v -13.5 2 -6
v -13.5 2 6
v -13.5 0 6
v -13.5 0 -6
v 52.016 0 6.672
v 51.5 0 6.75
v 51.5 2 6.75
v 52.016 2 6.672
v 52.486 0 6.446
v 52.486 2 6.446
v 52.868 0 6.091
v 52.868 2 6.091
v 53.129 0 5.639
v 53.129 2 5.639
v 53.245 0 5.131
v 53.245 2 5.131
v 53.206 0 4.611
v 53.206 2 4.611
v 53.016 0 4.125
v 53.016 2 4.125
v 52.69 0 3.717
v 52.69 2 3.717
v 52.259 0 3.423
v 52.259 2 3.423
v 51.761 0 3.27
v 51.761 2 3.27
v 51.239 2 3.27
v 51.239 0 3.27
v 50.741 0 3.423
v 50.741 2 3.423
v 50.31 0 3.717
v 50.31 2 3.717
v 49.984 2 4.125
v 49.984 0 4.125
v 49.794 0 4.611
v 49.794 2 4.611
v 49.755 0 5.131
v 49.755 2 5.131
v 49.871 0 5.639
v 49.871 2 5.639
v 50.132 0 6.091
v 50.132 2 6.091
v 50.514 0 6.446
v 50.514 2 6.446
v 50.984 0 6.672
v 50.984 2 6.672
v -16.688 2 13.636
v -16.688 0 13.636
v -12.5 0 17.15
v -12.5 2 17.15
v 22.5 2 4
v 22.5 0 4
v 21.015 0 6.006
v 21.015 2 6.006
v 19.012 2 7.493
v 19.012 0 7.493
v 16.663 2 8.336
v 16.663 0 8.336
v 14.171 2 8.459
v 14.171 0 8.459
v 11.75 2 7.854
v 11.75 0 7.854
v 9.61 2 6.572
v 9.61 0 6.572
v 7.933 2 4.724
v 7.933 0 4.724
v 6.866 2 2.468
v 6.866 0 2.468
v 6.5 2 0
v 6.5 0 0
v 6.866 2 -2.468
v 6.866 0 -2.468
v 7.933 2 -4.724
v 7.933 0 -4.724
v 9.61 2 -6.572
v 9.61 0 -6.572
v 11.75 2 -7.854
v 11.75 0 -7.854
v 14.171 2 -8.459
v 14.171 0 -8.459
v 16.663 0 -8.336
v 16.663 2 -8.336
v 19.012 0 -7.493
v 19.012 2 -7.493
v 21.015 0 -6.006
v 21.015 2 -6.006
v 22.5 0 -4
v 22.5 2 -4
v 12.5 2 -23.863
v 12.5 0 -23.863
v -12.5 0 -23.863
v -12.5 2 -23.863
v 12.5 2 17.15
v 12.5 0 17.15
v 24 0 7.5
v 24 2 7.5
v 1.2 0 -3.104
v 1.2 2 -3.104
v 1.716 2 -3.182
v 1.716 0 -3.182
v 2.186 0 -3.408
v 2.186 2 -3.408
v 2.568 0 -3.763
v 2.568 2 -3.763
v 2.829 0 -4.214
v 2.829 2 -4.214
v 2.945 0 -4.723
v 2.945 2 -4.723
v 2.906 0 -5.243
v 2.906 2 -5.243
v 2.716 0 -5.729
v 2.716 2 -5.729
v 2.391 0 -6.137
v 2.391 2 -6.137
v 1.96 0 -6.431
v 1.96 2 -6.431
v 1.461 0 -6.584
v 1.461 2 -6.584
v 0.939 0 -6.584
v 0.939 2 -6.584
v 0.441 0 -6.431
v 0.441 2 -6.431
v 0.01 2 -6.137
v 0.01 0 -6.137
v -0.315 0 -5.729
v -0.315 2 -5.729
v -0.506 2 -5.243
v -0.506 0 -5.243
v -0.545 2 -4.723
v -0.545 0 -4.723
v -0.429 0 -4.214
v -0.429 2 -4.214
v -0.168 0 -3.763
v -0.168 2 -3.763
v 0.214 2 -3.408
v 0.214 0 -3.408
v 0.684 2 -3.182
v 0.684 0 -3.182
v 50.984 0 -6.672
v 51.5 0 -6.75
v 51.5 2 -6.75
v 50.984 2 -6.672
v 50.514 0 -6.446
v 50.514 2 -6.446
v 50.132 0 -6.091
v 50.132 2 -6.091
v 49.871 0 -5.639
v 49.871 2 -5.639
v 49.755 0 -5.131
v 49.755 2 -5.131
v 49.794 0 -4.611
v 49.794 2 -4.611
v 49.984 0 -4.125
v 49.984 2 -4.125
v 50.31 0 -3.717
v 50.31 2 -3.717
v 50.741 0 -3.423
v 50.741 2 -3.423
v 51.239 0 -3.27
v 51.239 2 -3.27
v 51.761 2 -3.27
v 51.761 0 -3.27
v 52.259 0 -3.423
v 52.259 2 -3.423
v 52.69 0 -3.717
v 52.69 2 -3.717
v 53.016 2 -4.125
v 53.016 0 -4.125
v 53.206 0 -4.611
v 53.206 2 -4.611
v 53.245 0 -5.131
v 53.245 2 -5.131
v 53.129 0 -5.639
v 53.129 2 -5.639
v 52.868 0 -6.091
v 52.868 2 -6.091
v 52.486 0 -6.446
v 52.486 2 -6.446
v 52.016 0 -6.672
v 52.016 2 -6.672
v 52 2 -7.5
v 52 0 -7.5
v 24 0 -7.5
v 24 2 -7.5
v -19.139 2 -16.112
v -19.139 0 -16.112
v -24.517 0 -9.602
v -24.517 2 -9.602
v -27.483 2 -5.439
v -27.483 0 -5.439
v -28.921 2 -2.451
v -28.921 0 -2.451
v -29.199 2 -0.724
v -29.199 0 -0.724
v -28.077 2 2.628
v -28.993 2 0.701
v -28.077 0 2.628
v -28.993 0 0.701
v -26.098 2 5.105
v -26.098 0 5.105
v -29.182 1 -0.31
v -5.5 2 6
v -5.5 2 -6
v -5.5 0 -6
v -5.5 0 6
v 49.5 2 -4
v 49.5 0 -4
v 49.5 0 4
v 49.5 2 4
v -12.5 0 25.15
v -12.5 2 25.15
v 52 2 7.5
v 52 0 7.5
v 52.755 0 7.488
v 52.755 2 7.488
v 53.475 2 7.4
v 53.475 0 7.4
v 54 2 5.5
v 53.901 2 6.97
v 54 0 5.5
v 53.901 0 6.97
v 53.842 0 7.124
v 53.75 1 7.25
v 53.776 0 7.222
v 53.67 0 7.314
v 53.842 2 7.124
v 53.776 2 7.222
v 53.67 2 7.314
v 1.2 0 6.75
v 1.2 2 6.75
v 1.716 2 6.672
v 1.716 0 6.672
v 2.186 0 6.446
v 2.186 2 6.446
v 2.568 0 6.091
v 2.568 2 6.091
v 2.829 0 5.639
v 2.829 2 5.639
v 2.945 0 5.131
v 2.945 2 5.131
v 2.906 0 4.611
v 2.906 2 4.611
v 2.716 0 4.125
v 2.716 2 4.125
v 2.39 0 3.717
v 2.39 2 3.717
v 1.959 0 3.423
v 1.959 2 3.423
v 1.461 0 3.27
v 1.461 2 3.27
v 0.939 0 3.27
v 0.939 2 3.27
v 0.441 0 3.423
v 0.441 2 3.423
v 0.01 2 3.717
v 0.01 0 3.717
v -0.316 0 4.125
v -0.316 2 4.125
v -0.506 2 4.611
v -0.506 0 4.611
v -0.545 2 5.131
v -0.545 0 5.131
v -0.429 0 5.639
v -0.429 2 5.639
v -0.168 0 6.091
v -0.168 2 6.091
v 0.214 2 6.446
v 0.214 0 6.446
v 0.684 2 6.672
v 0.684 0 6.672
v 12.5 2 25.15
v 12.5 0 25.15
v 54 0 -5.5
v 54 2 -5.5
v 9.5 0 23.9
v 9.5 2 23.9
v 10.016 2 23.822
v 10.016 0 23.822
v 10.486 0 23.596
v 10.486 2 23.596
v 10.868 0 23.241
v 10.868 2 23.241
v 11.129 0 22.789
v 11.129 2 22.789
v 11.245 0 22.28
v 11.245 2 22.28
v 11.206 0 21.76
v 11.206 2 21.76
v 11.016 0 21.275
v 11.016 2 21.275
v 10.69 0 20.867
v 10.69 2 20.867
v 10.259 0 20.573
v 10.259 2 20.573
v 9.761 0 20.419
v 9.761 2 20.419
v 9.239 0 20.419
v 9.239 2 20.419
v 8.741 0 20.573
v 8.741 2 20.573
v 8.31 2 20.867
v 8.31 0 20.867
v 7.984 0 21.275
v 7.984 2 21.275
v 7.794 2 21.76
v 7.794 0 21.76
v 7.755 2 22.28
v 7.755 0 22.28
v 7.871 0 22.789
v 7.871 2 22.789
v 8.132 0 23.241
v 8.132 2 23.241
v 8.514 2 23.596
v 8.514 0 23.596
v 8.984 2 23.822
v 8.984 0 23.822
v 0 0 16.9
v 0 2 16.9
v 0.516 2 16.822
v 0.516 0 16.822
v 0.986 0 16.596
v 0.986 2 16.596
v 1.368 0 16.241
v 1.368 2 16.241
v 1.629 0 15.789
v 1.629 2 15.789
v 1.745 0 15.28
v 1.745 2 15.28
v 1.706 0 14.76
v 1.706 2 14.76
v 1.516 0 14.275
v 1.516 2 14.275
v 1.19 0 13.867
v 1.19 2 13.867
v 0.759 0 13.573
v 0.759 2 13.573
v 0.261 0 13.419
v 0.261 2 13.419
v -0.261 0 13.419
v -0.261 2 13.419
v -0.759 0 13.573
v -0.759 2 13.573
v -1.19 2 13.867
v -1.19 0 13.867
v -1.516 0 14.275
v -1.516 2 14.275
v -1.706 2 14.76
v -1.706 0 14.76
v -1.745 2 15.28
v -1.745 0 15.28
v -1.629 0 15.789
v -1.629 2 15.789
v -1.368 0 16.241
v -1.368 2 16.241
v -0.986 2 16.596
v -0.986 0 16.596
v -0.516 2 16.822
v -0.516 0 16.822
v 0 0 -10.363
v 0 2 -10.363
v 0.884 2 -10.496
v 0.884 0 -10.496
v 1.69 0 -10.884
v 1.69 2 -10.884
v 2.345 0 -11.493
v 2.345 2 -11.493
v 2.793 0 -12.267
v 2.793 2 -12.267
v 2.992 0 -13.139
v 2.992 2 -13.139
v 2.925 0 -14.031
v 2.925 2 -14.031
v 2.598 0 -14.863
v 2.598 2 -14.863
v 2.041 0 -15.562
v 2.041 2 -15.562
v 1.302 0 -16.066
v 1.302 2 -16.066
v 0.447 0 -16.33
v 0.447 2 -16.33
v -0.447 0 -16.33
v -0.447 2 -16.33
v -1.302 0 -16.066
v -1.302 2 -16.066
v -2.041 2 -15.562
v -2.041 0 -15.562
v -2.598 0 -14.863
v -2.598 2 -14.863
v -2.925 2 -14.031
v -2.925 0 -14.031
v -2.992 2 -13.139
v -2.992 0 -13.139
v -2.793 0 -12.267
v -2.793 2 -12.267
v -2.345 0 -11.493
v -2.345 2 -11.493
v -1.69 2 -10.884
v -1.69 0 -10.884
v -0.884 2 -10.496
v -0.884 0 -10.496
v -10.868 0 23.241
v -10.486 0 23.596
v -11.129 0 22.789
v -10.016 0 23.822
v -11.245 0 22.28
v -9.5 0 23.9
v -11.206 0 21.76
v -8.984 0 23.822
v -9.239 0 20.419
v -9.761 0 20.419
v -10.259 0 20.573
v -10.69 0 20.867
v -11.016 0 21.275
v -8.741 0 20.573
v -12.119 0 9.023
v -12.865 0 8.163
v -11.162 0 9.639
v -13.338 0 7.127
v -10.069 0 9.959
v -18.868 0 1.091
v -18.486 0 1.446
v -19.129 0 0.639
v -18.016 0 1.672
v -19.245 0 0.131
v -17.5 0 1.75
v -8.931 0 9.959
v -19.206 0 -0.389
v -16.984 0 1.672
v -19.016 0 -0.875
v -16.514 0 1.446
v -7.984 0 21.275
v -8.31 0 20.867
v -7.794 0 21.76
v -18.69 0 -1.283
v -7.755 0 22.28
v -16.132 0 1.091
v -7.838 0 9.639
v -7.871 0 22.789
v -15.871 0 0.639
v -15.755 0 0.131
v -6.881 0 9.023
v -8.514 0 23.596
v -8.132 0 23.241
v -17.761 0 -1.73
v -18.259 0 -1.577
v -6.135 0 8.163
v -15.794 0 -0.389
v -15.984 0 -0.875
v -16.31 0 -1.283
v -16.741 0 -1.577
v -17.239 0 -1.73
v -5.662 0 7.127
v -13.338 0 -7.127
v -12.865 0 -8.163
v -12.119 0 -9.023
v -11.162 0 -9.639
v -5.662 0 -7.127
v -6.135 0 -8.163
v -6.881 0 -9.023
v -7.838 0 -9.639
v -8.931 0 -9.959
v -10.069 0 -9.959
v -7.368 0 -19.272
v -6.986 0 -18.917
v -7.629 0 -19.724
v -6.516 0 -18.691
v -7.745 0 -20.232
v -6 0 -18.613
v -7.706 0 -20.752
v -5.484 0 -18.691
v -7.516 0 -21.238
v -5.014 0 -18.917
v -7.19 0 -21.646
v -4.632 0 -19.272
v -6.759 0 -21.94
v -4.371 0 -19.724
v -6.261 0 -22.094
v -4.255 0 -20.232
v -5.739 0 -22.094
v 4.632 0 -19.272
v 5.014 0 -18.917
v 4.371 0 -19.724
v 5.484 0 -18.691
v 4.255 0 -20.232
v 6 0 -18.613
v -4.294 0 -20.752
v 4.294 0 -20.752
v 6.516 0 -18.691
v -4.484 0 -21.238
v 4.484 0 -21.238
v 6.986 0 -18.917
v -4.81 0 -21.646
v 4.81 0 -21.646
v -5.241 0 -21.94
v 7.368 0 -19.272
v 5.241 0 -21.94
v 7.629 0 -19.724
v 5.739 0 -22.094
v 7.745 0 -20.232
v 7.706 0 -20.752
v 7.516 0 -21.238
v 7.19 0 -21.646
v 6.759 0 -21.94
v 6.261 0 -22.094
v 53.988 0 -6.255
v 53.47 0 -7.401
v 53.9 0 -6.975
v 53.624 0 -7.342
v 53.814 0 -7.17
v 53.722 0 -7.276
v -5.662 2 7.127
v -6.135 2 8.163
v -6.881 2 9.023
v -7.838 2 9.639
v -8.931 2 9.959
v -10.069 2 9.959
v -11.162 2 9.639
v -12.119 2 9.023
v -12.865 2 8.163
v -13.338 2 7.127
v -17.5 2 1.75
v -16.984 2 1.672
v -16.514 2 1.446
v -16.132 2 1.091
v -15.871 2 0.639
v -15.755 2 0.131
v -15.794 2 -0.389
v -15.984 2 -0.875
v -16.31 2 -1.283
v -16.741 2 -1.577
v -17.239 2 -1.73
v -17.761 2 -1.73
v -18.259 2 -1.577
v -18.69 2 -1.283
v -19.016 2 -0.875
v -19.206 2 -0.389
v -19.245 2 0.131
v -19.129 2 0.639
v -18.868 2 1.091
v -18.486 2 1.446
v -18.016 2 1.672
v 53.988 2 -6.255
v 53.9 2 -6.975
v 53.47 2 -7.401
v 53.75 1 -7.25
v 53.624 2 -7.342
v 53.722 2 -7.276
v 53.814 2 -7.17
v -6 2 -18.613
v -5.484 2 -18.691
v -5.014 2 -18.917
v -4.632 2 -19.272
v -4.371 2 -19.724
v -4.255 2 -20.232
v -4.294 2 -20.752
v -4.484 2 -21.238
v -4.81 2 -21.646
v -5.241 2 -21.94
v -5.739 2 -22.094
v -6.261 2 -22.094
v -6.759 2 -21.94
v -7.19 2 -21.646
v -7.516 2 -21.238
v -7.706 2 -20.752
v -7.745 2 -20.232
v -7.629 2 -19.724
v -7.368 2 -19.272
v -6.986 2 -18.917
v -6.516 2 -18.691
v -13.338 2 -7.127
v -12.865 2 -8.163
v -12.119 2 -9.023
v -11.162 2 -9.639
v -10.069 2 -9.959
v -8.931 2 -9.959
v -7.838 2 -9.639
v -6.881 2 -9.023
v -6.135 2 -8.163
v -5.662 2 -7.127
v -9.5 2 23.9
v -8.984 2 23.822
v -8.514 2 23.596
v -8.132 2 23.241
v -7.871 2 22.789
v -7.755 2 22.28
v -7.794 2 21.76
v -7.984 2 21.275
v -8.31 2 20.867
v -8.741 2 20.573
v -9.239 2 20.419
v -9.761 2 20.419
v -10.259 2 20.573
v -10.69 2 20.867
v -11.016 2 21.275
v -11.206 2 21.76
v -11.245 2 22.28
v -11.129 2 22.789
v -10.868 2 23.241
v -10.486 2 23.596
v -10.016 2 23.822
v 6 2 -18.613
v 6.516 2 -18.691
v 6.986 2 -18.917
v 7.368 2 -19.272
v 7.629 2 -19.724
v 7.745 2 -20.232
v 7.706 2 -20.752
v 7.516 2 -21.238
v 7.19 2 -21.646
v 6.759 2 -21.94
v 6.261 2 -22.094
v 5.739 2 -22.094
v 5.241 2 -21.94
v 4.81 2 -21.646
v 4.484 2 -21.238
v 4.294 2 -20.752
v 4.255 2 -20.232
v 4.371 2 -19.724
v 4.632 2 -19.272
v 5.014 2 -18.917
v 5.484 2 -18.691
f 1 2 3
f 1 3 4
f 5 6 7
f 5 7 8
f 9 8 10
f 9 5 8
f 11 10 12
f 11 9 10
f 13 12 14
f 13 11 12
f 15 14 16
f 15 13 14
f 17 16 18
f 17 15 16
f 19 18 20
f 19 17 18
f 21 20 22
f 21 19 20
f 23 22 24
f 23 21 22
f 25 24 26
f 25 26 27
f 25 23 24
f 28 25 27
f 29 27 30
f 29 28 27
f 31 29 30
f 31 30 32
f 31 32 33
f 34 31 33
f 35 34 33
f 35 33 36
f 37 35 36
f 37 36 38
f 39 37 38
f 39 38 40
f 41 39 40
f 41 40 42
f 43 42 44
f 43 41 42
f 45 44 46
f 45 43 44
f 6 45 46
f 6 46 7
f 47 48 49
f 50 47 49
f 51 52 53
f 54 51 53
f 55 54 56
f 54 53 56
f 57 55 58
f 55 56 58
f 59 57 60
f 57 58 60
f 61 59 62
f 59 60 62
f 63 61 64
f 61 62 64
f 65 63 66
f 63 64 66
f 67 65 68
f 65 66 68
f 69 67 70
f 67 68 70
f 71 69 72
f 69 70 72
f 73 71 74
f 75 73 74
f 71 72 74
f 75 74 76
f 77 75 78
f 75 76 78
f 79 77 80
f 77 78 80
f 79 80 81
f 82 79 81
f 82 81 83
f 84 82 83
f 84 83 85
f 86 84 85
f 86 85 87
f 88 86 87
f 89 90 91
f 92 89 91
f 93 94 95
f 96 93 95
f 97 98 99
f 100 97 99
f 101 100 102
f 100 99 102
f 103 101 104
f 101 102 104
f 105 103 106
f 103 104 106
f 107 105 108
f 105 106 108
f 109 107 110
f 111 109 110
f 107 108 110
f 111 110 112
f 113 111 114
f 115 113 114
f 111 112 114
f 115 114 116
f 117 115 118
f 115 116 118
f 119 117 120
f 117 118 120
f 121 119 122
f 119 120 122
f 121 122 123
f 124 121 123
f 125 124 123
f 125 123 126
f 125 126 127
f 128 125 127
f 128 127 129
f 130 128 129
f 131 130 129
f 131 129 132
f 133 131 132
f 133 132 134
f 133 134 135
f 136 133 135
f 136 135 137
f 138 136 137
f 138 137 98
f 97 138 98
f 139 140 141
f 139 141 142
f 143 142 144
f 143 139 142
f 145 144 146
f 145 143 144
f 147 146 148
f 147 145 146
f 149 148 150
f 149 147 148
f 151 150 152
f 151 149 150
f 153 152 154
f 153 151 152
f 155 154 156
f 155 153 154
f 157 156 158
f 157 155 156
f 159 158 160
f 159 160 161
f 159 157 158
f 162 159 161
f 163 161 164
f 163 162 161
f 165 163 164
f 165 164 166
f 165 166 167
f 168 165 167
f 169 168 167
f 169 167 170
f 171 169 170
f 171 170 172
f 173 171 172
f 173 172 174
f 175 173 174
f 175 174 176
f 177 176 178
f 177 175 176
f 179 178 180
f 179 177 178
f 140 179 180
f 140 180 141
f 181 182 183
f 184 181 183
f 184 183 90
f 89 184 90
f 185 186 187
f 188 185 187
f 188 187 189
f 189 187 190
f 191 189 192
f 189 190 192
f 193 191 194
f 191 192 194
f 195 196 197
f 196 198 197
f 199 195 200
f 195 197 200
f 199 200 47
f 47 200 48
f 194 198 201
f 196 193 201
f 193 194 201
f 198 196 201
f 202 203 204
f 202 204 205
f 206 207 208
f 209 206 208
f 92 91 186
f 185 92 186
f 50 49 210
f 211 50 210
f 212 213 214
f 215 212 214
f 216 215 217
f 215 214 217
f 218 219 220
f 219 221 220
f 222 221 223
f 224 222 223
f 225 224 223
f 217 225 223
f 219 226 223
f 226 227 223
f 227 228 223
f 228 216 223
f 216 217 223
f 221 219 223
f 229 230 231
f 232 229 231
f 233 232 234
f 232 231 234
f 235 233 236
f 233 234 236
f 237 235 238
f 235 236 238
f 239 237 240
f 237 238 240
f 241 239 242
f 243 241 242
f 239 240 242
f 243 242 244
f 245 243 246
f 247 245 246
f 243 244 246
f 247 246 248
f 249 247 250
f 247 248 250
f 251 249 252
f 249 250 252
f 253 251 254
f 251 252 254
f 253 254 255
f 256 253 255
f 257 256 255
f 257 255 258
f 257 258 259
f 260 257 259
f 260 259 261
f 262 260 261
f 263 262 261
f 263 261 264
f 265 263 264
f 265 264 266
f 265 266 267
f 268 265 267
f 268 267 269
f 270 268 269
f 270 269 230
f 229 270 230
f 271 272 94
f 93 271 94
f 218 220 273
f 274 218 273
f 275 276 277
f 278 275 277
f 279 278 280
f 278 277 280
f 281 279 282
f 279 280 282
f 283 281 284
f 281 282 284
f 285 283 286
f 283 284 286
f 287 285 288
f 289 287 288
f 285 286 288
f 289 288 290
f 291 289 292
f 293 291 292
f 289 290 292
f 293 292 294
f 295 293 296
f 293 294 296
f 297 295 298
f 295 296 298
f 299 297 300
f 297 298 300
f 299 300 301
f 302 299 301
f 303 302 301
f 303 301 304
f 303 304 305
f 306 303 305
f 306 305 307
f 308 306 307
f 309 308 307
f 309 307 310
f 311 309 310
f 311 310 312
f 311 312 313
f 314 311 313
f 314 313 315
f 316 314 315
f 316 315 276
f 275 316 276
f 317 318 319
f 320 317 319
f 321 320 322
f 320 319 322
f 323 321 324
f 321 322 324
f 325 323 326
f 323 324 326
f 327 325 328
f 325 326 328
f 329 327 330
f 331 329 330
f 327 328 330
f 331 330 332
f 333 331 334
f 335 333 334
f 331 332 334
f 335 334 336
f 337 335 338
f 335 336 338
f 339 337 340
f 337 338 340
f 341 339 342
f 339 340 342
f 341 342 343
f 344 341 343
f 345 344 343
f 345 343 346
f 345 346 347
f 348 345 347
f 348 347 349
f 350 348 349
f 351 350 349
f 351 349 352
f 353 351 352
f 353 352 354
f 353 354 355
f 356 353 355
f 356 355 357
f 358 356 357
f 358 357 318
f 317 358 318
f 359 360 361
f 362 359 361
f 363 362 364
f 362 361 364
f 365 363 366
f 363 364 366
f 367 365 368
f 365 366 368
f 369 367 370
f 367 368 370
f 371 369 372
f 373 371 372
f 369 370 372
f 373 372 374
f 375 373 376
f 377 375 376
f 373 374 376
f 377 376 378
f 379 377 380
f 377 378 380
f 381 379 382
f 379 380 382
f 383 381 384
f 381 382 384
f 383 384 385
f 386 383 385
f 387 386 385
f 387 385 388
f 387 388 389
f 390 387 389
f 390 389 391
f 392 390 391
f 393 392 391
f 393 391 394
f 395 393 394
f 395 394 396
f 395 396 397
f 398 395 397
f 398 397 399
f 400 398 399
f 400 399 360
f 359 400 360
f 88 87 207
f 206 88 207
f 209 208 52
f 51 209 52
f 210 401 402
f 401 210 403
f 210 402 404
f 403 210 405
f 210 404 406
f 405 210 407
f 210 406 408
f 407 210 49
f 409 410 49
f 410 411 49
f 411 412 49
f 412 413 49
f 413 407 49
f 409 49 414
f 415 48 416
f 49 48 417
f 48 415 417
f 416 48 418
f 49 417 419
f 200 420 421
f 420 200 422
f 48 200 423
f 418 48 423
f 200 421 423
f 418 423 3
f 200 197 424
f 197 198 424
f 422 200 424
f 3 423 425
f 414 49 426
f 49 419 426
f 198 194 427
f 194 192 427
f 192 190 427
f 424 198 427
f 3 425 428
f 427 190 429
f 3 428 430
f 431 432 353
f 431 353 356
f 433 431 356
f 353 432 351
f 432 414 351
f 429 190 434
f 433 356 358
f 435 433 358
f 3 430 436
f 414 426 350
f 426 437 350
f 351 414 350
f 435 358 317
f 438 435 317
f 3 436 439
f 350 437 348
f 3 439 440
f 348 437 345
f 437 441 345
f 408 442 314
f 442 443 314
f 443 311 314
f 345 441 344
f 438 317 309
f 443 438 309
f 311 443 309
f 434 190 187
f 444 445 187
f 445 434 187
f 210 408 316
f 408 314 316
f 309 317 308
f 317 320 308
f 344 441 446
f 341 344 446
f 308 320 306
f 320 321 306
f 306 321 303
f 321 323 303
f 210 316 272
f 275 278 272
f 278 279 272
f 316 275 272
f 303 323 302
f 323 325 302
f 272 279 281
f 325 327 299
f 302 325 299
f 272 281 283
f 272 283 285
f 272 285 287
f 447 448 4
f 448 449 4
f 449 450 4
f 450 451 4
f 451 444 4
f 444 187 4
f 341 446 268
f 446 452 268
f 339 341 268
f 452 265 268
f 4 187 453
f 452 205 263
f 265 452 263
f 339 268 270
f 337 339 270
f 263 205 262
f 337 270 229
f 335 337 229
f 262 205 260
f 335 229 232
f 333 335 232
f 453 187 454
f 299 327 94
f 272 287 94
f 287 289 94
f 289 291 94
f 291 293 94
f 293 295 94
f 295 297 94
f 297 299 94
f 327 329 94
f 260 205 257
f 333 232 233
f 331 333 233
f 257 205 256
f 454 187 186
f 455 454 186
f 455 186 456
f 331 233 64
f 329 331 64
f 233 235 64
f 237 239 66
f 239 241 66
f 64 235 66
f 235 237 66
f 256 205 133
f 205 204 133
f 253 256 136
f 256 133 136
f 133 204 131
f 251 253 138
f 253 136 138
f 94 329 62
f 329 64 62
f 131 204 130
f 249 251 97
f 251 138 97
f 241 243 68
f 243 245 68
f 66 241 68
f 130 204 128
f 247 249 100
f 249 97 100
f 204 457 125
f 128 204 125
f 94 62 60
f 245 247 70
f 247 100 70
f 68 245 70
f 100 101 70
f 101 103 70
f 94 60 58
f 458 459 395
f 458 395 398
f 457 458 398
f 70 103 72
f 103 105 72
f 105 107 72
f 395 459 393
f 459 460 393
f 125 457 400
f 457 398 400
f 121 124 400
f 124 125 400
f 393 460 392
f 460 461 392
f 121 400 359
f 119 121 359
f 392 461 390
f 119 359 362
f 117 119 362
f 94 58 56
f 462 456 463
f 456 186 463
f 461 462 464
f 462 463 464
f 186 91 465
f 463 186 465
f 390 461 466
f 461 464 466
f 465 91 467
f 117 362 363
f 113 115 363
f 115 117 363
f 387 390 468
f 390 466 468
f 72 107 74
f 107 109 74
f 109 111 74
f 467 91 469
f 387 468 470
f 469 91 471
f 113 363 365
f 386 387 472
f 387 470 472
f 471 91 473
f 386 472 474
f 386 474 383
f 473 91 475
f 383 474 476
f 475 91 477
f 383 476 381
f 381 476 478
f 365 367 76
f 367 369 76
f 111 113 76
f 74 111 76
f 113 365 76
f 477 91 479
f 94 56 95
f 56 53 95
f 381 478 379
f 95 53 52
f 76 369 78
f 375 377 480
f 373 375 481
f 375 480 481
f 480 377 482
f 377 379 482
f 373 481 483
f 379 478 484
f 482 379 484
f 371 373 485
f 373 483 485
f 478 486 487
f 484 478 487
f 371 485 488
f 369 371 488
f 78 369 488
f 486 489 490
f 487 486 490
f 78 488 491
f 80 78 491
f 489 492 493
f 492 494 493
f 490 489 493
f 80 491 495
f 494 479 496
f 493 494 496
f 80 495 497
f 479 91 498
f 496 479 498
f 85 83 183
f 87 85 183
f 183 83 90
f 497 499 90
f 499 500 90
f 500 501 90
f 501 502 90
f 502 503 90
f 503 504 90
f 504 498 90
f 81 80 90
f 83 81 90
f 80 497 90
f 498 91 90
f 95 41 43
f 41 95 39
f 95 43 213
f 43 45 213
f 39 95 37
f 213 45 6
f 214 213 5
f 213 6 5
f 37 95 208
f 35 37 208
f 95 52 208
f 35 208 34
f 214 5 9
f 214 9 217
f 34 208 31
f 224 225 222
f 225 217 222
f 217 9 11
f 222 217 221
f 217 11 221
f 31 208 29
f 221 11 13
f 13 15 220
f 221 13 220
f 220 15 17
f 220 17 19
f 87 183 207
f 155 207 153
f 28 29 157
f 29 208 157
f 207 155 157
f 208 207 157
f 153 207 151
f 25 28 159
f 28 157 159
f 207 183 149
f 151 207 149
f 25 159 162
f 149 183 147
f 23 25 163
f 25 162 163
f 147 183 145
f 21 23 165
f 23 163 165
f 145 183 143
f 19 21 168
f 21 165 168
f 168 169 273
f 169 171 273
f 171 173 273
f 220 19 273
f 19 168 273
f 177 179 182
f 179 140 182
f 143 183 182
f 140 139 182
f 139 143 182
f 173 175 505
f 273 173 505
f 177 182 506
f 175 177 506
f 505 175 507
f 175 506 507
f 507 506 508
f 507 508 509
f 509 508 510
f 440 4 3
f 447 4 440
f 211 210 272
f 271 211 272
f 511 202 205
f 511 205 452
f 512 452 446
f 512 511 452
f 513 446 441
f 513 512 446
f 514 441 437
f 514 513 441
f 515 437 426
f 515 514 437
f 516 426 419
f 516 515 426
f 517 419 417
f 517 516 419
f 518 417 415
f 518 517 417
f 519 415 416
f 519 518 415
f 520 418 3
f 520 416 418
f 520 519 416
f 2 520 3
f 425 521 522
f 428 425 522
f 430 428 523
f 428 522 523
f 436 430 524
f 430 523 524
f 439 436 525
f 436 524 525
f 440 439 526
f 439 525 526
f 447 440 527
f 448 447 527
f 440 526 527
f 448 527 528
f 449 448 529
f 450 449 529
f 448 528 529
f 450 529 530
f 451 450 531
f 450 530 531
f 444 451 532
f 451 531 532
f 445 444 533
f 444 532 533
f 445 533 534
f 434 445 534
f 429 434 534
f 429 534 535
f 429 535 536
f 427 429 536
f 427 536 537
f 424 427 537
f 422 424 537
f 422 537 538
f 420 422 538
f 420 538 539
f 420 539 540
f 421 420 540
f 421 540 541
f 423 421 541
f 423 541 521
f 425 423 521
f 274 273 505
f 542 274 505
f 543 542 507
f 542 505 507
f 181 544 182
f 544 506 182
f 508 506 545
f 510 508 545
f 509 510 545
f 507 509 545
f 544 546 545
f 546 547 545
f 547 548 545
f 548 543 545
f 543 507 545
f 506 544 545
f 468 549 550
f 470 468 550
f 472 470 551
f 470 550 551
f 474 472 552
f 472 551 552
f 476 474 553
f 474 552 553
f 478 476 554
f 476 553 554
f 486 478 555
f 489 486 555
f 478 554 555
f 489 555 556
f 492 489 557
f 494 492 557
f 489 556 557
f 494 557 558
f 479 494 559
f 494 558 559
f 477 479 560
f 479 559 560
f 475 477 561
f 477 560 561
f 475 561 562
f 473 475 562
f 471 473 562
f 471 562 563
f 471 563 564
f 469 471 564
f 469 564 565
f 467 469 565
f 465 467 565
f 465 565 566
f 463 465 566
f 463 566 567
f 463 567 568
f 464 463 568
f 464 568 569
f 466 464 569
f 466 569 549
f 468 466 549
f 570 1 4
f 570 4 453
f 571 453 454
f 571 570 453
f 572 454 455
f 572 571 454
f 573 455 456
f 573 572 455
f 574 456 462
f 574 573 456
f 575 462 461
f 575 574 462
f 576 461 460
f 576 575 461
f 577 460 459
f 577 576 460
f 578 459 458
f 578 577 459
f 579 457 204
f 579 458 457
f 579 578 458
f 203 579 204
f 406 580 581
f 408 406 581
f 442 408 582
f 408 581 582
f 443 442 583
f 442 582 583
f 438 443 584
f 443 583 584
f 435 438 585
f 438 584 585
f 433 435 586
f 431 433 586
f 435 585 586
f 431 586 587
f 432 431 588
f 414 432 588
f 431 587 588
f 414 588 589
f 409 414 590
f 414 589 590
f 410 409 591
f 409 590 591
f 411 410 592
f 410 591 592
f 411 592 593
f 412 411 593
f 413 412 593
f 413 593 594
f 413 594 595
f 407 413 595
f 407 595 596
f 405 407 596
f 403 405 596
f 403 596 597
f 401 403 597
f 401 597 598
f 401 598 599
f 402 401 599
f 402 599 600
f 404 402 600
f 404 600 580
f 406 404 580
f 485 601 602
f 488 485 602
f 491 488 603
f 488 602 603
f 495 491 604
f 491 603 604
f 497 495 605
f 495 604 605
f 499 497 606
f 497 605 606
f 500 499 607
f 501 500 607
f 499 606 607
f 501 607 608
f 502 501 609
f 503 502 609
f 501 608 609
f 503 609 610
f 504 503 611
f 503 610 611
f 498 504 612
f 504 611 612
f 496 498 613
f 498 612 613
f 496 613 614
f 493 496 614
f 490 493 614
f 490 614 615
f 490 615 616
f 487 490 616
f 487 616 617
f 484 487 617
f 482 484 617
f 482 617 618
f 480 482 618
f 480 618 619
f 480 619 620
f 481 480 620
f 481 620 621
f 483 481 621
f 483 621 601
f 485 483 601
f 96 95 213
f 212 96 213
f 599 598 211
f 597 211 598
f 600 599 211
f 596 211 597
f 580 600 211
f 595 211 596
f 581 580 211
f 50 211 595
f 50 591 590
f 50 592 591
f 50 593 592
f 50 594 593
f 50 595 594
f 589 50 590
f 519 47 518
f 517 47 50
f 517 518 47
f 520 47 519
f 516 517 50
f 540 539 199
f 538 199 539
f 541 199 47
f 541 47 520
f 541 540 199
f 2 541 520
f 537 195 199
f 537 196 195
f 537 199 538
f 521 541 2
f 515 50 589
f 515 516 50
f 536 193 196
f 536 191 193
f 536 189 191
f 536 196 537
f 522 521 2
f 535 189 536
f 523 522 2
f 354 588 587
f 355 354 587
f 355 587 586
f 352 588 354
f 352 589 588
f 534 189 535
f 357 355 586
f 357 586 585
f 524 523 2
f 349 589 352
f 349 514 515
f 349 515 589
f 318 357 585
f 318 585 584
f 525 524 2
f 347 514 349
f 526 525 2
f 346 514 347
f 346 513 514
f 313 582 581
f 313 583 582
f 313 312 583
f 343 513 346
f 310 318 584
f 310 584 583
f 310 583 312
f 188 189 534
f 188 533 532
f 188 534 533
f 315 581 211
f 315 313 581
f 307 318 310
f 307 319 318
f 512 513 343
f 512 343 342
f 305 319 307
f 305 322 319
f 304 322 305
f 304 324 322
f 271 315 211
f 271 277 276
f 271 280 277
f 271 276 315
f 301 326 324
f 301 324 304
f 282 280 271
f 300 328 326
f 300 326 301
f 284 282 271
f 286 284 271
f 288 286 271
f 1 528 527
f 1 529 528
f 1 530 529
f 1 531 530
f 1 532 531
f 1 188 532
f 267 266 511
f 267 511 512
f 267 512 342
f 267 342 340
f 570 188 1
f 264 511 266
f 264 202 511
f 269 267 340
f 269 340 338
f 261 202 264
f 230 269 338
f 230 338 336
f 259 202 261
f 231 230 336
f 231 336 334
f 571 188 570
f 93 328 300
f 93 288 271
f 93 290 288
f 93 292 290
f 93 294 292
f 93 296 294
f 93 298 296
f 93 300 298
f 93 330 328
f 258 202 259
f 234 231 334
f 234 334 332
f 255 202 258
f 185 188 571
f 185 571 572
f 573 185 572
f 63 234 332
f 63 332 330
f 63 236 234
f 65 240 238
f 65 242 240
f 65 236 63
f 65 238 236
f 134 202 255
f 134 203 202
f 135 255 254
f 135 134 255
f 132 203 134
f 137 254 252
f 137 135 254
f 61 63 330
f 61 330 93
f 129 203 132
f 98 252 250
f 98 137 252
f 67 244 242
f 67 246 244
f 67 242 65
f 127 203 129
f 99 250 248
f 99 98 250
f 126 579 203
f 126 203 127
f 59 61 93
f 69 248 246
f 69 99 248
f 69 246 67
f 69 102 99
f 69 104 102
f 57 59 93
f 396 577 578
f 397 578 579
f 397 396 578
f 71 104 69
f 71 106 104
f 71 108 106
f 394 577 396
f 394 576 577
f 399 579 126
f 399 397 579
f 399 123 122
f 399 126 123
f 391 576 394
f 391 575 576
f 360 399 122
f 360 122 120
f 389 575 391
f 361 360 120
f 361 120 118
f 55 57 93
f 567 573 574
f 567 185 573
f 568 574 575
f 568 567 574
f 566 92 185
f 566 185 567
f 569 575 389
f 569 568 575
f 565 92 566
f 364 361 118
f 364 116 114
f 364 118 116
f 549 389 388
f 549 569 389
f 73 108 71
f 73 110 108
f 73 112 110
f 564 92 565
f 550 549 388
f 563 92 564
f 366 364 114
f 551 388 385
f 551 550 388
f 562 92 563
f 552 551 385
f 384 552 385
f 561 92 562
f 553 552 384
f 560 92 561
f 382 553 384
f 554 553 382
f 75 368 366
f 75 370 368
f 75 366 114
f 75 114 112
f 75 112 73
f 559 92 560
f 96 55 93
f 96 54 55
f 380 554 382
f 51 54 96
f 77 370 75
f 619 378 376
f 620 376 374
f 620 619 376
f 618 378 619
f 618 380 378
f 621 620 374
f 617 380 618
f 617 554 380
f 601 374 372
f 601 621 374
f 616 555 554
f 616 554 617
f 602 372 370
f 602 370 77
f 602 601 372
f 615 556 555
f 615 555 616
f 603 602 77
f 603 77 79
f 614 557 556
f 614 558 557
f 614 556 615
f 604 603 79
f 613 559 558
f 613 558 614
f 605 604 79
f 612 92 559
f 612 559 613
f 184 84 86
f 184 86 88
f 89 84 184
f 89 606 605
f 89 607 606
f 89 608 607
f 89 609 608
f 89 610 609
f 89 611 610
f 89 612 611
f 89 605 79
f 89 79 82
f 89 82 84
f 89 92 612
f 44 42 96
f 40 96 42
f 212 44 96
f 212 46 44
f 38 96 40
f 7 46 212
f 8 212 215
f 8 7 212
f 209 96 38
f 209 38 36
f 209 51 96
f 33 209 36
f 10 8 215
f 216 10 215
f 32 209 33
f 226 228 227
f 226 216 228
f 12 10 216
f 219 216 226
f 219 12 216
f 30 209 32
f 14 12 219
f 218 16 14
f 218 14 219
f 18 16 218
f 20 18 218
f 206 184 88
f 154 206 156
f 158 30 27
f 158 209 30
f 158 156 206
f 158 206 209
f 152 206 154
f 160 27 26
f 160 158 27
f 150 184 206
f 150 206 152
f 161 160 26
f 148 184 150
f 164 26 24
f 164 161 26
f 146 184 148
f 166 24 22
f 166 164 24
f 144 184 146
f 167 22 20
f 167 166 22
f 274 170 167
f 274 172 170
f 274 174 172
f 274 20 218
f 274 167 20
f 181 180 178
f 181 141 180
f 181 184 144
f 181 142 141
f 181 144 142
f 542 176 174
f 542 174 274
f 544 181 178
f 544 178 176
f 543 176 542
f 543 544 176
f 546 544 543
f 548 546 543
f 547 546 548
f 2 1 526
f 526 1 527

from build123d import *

# Parameters (mm, degrees)
SKETCH1_R           = 1.75
BOSS_EXTRUDE1_DEPTH = 2
FILLET3_SIZE        = 2
SKETCH2_R           = 1.75
SKETCH2_R_2         = 3
CUT_EXTRUDE1_DEPTH  = 60.602891692


with BuildPart() as part:
    # Sketch1 → Boss-Extrude1 (new body)
    with BuildSketch(Plane(origin=(0, 0, 0), x_dir=(1, 0, 0), z_dir=(0, 1, 0))):
        Polygon((12.5, -17.149645759), (24, -7.5), (54, -7.5), (54, 7.5), (24, 7.5), (12.5, 23.863068172), (-12.5, 23.863068172), (-32.938151944, 0), (-12.5, -17.149645759), (-12.5, -25.149645759), (12.5, -25.149645759), align=None)
        with Locations(Location((51.5, -5, 0), (0, 0, 270))):
            Circle(SKETCH1_R, mode=Mode.SUBTRACT)
        with Locations(Location((51.5, 5, 0), (0, 0, 90))):
            Circle(SKETCH1_R, mode=Mode.SUBTRACT)
        with BuildLine():
            Line((22.5, 4), (49.5, 4))
            Line((49.5, 4), (49.5, -4))
            Line((49.5, -4), (22.5, -4))
            ThreePointArc((22.5, -4), (6.5, 0), (22.5, 4))
        make_face(mode=Mode.SUBTRACT)
    extrude(amount=BOSS_EXTRUDE1_DEPTH)

    # Fillet2
    # a fillet whose section is not a circle: 21 mm, written as the material it takes off along each edge
    with BuildSketch(Plane(origin=(-32.938151944, -53.033486064, 0), x_dir=(0.650499477323288, 0, -0.7595067017493191), z_dir=(0, 1, 0))) as fillet2_piece_1:
        with BuildLine():
            Bezier((21.213394426, 0), (0, 0), (0.214467683, -21.212310262), weights=[1, 3, 1])
            Line((0.214467683, -21.212310262), (0, 0))
            Line((0, 0), (21.213394426, 0))
        make_face()
    extrude(amount=108.066972128, mode=Mode.SUBTRACT)

    # Fillet3
    # a fillet whose section is not a circle: 2 mm, written as the material it takes off along each edge
    with BuildSketch(Plane(origin=(54, -5, -7.5), x_dir=(0, 0, 1), z_dir=(0, 1, 0)), Plane(origin=(54, -5, 7.5), x_dir=(-1, 0, 0), z_dir=(0, 1, 0))) as fillet3_piece_1:
        with BuildLine():
            Bezier((FILLET3_SIZE, 0), (0, 0), (0, -FILLET3_SIZE), weights=[1, 3, 1])
            Line((0, -FILLET3_SIZE), (0, 0))
            Line((0, 0), (FILLET3_SIZE, 0))
        make_face()
    extrude(amount=12, mode=Mode.SUBTRACT)

    # Sketch2 → Cut-Extrude1 (cut, through all)
    with BuildSketch(Plane(origin=(0, 2, 0), x_dir=(1, 0, 0), z_dir=(0, 1, 0))):
        with Locations(Location((-9.5, -22.149645759, 0), (0, 0, 270))):
            Circle(SKETCH2_R)
        with Locations(Location((9.5, -22.149645759, 0), (0, 0, 270))):
            Circle(SKETCH2_R)
        with Locations(Location((6, 20.363068172, 0), (0, 0, 270))):
            Circle(SKETCH2_R)
        with Locations(Location((-6, 20.363068172, 0), (0, 0, 270))):
            Circle(SKETCH2_R)
        with Locations(Location((0, -15.149645759, 0), (0, 0, 270))):
            Circle(SKETCH2_R)
        with Locations(Location((-17.5, 0, 0), (0, 0, 270))):
            Circle(SKETCH2_R)
        with Locations(Location((1.200212435, 4.853811915, 0), (0, 0, 270))):
            Circle(SKETCH2_R)
        with Locations(Location((0, 13.363068172, 0), (0, 0, 270))):
            Circle(SKETCH2_R_2)
        with Locations(Location((1.2, -5, 0), (0, 0, 270))):
            Circle(SKETCH2_R)
        with BuildLine():
            Line((-5.5, 6), (-5.5, -6))
            ThreePointArc((-5.5, -6), (-9.5, -10), (-13.5, -6))
            Line((-13.5, -6), (-13.5, 6))
            ThreePointArc((-13.5, 6), (-9.5, 10), (-5.5, 6))
        make_face()
    extrude(amount=-CUT_EXTRUDE1_DEPTH, mode=Mode.SUBTRACT)


solid = part.part
